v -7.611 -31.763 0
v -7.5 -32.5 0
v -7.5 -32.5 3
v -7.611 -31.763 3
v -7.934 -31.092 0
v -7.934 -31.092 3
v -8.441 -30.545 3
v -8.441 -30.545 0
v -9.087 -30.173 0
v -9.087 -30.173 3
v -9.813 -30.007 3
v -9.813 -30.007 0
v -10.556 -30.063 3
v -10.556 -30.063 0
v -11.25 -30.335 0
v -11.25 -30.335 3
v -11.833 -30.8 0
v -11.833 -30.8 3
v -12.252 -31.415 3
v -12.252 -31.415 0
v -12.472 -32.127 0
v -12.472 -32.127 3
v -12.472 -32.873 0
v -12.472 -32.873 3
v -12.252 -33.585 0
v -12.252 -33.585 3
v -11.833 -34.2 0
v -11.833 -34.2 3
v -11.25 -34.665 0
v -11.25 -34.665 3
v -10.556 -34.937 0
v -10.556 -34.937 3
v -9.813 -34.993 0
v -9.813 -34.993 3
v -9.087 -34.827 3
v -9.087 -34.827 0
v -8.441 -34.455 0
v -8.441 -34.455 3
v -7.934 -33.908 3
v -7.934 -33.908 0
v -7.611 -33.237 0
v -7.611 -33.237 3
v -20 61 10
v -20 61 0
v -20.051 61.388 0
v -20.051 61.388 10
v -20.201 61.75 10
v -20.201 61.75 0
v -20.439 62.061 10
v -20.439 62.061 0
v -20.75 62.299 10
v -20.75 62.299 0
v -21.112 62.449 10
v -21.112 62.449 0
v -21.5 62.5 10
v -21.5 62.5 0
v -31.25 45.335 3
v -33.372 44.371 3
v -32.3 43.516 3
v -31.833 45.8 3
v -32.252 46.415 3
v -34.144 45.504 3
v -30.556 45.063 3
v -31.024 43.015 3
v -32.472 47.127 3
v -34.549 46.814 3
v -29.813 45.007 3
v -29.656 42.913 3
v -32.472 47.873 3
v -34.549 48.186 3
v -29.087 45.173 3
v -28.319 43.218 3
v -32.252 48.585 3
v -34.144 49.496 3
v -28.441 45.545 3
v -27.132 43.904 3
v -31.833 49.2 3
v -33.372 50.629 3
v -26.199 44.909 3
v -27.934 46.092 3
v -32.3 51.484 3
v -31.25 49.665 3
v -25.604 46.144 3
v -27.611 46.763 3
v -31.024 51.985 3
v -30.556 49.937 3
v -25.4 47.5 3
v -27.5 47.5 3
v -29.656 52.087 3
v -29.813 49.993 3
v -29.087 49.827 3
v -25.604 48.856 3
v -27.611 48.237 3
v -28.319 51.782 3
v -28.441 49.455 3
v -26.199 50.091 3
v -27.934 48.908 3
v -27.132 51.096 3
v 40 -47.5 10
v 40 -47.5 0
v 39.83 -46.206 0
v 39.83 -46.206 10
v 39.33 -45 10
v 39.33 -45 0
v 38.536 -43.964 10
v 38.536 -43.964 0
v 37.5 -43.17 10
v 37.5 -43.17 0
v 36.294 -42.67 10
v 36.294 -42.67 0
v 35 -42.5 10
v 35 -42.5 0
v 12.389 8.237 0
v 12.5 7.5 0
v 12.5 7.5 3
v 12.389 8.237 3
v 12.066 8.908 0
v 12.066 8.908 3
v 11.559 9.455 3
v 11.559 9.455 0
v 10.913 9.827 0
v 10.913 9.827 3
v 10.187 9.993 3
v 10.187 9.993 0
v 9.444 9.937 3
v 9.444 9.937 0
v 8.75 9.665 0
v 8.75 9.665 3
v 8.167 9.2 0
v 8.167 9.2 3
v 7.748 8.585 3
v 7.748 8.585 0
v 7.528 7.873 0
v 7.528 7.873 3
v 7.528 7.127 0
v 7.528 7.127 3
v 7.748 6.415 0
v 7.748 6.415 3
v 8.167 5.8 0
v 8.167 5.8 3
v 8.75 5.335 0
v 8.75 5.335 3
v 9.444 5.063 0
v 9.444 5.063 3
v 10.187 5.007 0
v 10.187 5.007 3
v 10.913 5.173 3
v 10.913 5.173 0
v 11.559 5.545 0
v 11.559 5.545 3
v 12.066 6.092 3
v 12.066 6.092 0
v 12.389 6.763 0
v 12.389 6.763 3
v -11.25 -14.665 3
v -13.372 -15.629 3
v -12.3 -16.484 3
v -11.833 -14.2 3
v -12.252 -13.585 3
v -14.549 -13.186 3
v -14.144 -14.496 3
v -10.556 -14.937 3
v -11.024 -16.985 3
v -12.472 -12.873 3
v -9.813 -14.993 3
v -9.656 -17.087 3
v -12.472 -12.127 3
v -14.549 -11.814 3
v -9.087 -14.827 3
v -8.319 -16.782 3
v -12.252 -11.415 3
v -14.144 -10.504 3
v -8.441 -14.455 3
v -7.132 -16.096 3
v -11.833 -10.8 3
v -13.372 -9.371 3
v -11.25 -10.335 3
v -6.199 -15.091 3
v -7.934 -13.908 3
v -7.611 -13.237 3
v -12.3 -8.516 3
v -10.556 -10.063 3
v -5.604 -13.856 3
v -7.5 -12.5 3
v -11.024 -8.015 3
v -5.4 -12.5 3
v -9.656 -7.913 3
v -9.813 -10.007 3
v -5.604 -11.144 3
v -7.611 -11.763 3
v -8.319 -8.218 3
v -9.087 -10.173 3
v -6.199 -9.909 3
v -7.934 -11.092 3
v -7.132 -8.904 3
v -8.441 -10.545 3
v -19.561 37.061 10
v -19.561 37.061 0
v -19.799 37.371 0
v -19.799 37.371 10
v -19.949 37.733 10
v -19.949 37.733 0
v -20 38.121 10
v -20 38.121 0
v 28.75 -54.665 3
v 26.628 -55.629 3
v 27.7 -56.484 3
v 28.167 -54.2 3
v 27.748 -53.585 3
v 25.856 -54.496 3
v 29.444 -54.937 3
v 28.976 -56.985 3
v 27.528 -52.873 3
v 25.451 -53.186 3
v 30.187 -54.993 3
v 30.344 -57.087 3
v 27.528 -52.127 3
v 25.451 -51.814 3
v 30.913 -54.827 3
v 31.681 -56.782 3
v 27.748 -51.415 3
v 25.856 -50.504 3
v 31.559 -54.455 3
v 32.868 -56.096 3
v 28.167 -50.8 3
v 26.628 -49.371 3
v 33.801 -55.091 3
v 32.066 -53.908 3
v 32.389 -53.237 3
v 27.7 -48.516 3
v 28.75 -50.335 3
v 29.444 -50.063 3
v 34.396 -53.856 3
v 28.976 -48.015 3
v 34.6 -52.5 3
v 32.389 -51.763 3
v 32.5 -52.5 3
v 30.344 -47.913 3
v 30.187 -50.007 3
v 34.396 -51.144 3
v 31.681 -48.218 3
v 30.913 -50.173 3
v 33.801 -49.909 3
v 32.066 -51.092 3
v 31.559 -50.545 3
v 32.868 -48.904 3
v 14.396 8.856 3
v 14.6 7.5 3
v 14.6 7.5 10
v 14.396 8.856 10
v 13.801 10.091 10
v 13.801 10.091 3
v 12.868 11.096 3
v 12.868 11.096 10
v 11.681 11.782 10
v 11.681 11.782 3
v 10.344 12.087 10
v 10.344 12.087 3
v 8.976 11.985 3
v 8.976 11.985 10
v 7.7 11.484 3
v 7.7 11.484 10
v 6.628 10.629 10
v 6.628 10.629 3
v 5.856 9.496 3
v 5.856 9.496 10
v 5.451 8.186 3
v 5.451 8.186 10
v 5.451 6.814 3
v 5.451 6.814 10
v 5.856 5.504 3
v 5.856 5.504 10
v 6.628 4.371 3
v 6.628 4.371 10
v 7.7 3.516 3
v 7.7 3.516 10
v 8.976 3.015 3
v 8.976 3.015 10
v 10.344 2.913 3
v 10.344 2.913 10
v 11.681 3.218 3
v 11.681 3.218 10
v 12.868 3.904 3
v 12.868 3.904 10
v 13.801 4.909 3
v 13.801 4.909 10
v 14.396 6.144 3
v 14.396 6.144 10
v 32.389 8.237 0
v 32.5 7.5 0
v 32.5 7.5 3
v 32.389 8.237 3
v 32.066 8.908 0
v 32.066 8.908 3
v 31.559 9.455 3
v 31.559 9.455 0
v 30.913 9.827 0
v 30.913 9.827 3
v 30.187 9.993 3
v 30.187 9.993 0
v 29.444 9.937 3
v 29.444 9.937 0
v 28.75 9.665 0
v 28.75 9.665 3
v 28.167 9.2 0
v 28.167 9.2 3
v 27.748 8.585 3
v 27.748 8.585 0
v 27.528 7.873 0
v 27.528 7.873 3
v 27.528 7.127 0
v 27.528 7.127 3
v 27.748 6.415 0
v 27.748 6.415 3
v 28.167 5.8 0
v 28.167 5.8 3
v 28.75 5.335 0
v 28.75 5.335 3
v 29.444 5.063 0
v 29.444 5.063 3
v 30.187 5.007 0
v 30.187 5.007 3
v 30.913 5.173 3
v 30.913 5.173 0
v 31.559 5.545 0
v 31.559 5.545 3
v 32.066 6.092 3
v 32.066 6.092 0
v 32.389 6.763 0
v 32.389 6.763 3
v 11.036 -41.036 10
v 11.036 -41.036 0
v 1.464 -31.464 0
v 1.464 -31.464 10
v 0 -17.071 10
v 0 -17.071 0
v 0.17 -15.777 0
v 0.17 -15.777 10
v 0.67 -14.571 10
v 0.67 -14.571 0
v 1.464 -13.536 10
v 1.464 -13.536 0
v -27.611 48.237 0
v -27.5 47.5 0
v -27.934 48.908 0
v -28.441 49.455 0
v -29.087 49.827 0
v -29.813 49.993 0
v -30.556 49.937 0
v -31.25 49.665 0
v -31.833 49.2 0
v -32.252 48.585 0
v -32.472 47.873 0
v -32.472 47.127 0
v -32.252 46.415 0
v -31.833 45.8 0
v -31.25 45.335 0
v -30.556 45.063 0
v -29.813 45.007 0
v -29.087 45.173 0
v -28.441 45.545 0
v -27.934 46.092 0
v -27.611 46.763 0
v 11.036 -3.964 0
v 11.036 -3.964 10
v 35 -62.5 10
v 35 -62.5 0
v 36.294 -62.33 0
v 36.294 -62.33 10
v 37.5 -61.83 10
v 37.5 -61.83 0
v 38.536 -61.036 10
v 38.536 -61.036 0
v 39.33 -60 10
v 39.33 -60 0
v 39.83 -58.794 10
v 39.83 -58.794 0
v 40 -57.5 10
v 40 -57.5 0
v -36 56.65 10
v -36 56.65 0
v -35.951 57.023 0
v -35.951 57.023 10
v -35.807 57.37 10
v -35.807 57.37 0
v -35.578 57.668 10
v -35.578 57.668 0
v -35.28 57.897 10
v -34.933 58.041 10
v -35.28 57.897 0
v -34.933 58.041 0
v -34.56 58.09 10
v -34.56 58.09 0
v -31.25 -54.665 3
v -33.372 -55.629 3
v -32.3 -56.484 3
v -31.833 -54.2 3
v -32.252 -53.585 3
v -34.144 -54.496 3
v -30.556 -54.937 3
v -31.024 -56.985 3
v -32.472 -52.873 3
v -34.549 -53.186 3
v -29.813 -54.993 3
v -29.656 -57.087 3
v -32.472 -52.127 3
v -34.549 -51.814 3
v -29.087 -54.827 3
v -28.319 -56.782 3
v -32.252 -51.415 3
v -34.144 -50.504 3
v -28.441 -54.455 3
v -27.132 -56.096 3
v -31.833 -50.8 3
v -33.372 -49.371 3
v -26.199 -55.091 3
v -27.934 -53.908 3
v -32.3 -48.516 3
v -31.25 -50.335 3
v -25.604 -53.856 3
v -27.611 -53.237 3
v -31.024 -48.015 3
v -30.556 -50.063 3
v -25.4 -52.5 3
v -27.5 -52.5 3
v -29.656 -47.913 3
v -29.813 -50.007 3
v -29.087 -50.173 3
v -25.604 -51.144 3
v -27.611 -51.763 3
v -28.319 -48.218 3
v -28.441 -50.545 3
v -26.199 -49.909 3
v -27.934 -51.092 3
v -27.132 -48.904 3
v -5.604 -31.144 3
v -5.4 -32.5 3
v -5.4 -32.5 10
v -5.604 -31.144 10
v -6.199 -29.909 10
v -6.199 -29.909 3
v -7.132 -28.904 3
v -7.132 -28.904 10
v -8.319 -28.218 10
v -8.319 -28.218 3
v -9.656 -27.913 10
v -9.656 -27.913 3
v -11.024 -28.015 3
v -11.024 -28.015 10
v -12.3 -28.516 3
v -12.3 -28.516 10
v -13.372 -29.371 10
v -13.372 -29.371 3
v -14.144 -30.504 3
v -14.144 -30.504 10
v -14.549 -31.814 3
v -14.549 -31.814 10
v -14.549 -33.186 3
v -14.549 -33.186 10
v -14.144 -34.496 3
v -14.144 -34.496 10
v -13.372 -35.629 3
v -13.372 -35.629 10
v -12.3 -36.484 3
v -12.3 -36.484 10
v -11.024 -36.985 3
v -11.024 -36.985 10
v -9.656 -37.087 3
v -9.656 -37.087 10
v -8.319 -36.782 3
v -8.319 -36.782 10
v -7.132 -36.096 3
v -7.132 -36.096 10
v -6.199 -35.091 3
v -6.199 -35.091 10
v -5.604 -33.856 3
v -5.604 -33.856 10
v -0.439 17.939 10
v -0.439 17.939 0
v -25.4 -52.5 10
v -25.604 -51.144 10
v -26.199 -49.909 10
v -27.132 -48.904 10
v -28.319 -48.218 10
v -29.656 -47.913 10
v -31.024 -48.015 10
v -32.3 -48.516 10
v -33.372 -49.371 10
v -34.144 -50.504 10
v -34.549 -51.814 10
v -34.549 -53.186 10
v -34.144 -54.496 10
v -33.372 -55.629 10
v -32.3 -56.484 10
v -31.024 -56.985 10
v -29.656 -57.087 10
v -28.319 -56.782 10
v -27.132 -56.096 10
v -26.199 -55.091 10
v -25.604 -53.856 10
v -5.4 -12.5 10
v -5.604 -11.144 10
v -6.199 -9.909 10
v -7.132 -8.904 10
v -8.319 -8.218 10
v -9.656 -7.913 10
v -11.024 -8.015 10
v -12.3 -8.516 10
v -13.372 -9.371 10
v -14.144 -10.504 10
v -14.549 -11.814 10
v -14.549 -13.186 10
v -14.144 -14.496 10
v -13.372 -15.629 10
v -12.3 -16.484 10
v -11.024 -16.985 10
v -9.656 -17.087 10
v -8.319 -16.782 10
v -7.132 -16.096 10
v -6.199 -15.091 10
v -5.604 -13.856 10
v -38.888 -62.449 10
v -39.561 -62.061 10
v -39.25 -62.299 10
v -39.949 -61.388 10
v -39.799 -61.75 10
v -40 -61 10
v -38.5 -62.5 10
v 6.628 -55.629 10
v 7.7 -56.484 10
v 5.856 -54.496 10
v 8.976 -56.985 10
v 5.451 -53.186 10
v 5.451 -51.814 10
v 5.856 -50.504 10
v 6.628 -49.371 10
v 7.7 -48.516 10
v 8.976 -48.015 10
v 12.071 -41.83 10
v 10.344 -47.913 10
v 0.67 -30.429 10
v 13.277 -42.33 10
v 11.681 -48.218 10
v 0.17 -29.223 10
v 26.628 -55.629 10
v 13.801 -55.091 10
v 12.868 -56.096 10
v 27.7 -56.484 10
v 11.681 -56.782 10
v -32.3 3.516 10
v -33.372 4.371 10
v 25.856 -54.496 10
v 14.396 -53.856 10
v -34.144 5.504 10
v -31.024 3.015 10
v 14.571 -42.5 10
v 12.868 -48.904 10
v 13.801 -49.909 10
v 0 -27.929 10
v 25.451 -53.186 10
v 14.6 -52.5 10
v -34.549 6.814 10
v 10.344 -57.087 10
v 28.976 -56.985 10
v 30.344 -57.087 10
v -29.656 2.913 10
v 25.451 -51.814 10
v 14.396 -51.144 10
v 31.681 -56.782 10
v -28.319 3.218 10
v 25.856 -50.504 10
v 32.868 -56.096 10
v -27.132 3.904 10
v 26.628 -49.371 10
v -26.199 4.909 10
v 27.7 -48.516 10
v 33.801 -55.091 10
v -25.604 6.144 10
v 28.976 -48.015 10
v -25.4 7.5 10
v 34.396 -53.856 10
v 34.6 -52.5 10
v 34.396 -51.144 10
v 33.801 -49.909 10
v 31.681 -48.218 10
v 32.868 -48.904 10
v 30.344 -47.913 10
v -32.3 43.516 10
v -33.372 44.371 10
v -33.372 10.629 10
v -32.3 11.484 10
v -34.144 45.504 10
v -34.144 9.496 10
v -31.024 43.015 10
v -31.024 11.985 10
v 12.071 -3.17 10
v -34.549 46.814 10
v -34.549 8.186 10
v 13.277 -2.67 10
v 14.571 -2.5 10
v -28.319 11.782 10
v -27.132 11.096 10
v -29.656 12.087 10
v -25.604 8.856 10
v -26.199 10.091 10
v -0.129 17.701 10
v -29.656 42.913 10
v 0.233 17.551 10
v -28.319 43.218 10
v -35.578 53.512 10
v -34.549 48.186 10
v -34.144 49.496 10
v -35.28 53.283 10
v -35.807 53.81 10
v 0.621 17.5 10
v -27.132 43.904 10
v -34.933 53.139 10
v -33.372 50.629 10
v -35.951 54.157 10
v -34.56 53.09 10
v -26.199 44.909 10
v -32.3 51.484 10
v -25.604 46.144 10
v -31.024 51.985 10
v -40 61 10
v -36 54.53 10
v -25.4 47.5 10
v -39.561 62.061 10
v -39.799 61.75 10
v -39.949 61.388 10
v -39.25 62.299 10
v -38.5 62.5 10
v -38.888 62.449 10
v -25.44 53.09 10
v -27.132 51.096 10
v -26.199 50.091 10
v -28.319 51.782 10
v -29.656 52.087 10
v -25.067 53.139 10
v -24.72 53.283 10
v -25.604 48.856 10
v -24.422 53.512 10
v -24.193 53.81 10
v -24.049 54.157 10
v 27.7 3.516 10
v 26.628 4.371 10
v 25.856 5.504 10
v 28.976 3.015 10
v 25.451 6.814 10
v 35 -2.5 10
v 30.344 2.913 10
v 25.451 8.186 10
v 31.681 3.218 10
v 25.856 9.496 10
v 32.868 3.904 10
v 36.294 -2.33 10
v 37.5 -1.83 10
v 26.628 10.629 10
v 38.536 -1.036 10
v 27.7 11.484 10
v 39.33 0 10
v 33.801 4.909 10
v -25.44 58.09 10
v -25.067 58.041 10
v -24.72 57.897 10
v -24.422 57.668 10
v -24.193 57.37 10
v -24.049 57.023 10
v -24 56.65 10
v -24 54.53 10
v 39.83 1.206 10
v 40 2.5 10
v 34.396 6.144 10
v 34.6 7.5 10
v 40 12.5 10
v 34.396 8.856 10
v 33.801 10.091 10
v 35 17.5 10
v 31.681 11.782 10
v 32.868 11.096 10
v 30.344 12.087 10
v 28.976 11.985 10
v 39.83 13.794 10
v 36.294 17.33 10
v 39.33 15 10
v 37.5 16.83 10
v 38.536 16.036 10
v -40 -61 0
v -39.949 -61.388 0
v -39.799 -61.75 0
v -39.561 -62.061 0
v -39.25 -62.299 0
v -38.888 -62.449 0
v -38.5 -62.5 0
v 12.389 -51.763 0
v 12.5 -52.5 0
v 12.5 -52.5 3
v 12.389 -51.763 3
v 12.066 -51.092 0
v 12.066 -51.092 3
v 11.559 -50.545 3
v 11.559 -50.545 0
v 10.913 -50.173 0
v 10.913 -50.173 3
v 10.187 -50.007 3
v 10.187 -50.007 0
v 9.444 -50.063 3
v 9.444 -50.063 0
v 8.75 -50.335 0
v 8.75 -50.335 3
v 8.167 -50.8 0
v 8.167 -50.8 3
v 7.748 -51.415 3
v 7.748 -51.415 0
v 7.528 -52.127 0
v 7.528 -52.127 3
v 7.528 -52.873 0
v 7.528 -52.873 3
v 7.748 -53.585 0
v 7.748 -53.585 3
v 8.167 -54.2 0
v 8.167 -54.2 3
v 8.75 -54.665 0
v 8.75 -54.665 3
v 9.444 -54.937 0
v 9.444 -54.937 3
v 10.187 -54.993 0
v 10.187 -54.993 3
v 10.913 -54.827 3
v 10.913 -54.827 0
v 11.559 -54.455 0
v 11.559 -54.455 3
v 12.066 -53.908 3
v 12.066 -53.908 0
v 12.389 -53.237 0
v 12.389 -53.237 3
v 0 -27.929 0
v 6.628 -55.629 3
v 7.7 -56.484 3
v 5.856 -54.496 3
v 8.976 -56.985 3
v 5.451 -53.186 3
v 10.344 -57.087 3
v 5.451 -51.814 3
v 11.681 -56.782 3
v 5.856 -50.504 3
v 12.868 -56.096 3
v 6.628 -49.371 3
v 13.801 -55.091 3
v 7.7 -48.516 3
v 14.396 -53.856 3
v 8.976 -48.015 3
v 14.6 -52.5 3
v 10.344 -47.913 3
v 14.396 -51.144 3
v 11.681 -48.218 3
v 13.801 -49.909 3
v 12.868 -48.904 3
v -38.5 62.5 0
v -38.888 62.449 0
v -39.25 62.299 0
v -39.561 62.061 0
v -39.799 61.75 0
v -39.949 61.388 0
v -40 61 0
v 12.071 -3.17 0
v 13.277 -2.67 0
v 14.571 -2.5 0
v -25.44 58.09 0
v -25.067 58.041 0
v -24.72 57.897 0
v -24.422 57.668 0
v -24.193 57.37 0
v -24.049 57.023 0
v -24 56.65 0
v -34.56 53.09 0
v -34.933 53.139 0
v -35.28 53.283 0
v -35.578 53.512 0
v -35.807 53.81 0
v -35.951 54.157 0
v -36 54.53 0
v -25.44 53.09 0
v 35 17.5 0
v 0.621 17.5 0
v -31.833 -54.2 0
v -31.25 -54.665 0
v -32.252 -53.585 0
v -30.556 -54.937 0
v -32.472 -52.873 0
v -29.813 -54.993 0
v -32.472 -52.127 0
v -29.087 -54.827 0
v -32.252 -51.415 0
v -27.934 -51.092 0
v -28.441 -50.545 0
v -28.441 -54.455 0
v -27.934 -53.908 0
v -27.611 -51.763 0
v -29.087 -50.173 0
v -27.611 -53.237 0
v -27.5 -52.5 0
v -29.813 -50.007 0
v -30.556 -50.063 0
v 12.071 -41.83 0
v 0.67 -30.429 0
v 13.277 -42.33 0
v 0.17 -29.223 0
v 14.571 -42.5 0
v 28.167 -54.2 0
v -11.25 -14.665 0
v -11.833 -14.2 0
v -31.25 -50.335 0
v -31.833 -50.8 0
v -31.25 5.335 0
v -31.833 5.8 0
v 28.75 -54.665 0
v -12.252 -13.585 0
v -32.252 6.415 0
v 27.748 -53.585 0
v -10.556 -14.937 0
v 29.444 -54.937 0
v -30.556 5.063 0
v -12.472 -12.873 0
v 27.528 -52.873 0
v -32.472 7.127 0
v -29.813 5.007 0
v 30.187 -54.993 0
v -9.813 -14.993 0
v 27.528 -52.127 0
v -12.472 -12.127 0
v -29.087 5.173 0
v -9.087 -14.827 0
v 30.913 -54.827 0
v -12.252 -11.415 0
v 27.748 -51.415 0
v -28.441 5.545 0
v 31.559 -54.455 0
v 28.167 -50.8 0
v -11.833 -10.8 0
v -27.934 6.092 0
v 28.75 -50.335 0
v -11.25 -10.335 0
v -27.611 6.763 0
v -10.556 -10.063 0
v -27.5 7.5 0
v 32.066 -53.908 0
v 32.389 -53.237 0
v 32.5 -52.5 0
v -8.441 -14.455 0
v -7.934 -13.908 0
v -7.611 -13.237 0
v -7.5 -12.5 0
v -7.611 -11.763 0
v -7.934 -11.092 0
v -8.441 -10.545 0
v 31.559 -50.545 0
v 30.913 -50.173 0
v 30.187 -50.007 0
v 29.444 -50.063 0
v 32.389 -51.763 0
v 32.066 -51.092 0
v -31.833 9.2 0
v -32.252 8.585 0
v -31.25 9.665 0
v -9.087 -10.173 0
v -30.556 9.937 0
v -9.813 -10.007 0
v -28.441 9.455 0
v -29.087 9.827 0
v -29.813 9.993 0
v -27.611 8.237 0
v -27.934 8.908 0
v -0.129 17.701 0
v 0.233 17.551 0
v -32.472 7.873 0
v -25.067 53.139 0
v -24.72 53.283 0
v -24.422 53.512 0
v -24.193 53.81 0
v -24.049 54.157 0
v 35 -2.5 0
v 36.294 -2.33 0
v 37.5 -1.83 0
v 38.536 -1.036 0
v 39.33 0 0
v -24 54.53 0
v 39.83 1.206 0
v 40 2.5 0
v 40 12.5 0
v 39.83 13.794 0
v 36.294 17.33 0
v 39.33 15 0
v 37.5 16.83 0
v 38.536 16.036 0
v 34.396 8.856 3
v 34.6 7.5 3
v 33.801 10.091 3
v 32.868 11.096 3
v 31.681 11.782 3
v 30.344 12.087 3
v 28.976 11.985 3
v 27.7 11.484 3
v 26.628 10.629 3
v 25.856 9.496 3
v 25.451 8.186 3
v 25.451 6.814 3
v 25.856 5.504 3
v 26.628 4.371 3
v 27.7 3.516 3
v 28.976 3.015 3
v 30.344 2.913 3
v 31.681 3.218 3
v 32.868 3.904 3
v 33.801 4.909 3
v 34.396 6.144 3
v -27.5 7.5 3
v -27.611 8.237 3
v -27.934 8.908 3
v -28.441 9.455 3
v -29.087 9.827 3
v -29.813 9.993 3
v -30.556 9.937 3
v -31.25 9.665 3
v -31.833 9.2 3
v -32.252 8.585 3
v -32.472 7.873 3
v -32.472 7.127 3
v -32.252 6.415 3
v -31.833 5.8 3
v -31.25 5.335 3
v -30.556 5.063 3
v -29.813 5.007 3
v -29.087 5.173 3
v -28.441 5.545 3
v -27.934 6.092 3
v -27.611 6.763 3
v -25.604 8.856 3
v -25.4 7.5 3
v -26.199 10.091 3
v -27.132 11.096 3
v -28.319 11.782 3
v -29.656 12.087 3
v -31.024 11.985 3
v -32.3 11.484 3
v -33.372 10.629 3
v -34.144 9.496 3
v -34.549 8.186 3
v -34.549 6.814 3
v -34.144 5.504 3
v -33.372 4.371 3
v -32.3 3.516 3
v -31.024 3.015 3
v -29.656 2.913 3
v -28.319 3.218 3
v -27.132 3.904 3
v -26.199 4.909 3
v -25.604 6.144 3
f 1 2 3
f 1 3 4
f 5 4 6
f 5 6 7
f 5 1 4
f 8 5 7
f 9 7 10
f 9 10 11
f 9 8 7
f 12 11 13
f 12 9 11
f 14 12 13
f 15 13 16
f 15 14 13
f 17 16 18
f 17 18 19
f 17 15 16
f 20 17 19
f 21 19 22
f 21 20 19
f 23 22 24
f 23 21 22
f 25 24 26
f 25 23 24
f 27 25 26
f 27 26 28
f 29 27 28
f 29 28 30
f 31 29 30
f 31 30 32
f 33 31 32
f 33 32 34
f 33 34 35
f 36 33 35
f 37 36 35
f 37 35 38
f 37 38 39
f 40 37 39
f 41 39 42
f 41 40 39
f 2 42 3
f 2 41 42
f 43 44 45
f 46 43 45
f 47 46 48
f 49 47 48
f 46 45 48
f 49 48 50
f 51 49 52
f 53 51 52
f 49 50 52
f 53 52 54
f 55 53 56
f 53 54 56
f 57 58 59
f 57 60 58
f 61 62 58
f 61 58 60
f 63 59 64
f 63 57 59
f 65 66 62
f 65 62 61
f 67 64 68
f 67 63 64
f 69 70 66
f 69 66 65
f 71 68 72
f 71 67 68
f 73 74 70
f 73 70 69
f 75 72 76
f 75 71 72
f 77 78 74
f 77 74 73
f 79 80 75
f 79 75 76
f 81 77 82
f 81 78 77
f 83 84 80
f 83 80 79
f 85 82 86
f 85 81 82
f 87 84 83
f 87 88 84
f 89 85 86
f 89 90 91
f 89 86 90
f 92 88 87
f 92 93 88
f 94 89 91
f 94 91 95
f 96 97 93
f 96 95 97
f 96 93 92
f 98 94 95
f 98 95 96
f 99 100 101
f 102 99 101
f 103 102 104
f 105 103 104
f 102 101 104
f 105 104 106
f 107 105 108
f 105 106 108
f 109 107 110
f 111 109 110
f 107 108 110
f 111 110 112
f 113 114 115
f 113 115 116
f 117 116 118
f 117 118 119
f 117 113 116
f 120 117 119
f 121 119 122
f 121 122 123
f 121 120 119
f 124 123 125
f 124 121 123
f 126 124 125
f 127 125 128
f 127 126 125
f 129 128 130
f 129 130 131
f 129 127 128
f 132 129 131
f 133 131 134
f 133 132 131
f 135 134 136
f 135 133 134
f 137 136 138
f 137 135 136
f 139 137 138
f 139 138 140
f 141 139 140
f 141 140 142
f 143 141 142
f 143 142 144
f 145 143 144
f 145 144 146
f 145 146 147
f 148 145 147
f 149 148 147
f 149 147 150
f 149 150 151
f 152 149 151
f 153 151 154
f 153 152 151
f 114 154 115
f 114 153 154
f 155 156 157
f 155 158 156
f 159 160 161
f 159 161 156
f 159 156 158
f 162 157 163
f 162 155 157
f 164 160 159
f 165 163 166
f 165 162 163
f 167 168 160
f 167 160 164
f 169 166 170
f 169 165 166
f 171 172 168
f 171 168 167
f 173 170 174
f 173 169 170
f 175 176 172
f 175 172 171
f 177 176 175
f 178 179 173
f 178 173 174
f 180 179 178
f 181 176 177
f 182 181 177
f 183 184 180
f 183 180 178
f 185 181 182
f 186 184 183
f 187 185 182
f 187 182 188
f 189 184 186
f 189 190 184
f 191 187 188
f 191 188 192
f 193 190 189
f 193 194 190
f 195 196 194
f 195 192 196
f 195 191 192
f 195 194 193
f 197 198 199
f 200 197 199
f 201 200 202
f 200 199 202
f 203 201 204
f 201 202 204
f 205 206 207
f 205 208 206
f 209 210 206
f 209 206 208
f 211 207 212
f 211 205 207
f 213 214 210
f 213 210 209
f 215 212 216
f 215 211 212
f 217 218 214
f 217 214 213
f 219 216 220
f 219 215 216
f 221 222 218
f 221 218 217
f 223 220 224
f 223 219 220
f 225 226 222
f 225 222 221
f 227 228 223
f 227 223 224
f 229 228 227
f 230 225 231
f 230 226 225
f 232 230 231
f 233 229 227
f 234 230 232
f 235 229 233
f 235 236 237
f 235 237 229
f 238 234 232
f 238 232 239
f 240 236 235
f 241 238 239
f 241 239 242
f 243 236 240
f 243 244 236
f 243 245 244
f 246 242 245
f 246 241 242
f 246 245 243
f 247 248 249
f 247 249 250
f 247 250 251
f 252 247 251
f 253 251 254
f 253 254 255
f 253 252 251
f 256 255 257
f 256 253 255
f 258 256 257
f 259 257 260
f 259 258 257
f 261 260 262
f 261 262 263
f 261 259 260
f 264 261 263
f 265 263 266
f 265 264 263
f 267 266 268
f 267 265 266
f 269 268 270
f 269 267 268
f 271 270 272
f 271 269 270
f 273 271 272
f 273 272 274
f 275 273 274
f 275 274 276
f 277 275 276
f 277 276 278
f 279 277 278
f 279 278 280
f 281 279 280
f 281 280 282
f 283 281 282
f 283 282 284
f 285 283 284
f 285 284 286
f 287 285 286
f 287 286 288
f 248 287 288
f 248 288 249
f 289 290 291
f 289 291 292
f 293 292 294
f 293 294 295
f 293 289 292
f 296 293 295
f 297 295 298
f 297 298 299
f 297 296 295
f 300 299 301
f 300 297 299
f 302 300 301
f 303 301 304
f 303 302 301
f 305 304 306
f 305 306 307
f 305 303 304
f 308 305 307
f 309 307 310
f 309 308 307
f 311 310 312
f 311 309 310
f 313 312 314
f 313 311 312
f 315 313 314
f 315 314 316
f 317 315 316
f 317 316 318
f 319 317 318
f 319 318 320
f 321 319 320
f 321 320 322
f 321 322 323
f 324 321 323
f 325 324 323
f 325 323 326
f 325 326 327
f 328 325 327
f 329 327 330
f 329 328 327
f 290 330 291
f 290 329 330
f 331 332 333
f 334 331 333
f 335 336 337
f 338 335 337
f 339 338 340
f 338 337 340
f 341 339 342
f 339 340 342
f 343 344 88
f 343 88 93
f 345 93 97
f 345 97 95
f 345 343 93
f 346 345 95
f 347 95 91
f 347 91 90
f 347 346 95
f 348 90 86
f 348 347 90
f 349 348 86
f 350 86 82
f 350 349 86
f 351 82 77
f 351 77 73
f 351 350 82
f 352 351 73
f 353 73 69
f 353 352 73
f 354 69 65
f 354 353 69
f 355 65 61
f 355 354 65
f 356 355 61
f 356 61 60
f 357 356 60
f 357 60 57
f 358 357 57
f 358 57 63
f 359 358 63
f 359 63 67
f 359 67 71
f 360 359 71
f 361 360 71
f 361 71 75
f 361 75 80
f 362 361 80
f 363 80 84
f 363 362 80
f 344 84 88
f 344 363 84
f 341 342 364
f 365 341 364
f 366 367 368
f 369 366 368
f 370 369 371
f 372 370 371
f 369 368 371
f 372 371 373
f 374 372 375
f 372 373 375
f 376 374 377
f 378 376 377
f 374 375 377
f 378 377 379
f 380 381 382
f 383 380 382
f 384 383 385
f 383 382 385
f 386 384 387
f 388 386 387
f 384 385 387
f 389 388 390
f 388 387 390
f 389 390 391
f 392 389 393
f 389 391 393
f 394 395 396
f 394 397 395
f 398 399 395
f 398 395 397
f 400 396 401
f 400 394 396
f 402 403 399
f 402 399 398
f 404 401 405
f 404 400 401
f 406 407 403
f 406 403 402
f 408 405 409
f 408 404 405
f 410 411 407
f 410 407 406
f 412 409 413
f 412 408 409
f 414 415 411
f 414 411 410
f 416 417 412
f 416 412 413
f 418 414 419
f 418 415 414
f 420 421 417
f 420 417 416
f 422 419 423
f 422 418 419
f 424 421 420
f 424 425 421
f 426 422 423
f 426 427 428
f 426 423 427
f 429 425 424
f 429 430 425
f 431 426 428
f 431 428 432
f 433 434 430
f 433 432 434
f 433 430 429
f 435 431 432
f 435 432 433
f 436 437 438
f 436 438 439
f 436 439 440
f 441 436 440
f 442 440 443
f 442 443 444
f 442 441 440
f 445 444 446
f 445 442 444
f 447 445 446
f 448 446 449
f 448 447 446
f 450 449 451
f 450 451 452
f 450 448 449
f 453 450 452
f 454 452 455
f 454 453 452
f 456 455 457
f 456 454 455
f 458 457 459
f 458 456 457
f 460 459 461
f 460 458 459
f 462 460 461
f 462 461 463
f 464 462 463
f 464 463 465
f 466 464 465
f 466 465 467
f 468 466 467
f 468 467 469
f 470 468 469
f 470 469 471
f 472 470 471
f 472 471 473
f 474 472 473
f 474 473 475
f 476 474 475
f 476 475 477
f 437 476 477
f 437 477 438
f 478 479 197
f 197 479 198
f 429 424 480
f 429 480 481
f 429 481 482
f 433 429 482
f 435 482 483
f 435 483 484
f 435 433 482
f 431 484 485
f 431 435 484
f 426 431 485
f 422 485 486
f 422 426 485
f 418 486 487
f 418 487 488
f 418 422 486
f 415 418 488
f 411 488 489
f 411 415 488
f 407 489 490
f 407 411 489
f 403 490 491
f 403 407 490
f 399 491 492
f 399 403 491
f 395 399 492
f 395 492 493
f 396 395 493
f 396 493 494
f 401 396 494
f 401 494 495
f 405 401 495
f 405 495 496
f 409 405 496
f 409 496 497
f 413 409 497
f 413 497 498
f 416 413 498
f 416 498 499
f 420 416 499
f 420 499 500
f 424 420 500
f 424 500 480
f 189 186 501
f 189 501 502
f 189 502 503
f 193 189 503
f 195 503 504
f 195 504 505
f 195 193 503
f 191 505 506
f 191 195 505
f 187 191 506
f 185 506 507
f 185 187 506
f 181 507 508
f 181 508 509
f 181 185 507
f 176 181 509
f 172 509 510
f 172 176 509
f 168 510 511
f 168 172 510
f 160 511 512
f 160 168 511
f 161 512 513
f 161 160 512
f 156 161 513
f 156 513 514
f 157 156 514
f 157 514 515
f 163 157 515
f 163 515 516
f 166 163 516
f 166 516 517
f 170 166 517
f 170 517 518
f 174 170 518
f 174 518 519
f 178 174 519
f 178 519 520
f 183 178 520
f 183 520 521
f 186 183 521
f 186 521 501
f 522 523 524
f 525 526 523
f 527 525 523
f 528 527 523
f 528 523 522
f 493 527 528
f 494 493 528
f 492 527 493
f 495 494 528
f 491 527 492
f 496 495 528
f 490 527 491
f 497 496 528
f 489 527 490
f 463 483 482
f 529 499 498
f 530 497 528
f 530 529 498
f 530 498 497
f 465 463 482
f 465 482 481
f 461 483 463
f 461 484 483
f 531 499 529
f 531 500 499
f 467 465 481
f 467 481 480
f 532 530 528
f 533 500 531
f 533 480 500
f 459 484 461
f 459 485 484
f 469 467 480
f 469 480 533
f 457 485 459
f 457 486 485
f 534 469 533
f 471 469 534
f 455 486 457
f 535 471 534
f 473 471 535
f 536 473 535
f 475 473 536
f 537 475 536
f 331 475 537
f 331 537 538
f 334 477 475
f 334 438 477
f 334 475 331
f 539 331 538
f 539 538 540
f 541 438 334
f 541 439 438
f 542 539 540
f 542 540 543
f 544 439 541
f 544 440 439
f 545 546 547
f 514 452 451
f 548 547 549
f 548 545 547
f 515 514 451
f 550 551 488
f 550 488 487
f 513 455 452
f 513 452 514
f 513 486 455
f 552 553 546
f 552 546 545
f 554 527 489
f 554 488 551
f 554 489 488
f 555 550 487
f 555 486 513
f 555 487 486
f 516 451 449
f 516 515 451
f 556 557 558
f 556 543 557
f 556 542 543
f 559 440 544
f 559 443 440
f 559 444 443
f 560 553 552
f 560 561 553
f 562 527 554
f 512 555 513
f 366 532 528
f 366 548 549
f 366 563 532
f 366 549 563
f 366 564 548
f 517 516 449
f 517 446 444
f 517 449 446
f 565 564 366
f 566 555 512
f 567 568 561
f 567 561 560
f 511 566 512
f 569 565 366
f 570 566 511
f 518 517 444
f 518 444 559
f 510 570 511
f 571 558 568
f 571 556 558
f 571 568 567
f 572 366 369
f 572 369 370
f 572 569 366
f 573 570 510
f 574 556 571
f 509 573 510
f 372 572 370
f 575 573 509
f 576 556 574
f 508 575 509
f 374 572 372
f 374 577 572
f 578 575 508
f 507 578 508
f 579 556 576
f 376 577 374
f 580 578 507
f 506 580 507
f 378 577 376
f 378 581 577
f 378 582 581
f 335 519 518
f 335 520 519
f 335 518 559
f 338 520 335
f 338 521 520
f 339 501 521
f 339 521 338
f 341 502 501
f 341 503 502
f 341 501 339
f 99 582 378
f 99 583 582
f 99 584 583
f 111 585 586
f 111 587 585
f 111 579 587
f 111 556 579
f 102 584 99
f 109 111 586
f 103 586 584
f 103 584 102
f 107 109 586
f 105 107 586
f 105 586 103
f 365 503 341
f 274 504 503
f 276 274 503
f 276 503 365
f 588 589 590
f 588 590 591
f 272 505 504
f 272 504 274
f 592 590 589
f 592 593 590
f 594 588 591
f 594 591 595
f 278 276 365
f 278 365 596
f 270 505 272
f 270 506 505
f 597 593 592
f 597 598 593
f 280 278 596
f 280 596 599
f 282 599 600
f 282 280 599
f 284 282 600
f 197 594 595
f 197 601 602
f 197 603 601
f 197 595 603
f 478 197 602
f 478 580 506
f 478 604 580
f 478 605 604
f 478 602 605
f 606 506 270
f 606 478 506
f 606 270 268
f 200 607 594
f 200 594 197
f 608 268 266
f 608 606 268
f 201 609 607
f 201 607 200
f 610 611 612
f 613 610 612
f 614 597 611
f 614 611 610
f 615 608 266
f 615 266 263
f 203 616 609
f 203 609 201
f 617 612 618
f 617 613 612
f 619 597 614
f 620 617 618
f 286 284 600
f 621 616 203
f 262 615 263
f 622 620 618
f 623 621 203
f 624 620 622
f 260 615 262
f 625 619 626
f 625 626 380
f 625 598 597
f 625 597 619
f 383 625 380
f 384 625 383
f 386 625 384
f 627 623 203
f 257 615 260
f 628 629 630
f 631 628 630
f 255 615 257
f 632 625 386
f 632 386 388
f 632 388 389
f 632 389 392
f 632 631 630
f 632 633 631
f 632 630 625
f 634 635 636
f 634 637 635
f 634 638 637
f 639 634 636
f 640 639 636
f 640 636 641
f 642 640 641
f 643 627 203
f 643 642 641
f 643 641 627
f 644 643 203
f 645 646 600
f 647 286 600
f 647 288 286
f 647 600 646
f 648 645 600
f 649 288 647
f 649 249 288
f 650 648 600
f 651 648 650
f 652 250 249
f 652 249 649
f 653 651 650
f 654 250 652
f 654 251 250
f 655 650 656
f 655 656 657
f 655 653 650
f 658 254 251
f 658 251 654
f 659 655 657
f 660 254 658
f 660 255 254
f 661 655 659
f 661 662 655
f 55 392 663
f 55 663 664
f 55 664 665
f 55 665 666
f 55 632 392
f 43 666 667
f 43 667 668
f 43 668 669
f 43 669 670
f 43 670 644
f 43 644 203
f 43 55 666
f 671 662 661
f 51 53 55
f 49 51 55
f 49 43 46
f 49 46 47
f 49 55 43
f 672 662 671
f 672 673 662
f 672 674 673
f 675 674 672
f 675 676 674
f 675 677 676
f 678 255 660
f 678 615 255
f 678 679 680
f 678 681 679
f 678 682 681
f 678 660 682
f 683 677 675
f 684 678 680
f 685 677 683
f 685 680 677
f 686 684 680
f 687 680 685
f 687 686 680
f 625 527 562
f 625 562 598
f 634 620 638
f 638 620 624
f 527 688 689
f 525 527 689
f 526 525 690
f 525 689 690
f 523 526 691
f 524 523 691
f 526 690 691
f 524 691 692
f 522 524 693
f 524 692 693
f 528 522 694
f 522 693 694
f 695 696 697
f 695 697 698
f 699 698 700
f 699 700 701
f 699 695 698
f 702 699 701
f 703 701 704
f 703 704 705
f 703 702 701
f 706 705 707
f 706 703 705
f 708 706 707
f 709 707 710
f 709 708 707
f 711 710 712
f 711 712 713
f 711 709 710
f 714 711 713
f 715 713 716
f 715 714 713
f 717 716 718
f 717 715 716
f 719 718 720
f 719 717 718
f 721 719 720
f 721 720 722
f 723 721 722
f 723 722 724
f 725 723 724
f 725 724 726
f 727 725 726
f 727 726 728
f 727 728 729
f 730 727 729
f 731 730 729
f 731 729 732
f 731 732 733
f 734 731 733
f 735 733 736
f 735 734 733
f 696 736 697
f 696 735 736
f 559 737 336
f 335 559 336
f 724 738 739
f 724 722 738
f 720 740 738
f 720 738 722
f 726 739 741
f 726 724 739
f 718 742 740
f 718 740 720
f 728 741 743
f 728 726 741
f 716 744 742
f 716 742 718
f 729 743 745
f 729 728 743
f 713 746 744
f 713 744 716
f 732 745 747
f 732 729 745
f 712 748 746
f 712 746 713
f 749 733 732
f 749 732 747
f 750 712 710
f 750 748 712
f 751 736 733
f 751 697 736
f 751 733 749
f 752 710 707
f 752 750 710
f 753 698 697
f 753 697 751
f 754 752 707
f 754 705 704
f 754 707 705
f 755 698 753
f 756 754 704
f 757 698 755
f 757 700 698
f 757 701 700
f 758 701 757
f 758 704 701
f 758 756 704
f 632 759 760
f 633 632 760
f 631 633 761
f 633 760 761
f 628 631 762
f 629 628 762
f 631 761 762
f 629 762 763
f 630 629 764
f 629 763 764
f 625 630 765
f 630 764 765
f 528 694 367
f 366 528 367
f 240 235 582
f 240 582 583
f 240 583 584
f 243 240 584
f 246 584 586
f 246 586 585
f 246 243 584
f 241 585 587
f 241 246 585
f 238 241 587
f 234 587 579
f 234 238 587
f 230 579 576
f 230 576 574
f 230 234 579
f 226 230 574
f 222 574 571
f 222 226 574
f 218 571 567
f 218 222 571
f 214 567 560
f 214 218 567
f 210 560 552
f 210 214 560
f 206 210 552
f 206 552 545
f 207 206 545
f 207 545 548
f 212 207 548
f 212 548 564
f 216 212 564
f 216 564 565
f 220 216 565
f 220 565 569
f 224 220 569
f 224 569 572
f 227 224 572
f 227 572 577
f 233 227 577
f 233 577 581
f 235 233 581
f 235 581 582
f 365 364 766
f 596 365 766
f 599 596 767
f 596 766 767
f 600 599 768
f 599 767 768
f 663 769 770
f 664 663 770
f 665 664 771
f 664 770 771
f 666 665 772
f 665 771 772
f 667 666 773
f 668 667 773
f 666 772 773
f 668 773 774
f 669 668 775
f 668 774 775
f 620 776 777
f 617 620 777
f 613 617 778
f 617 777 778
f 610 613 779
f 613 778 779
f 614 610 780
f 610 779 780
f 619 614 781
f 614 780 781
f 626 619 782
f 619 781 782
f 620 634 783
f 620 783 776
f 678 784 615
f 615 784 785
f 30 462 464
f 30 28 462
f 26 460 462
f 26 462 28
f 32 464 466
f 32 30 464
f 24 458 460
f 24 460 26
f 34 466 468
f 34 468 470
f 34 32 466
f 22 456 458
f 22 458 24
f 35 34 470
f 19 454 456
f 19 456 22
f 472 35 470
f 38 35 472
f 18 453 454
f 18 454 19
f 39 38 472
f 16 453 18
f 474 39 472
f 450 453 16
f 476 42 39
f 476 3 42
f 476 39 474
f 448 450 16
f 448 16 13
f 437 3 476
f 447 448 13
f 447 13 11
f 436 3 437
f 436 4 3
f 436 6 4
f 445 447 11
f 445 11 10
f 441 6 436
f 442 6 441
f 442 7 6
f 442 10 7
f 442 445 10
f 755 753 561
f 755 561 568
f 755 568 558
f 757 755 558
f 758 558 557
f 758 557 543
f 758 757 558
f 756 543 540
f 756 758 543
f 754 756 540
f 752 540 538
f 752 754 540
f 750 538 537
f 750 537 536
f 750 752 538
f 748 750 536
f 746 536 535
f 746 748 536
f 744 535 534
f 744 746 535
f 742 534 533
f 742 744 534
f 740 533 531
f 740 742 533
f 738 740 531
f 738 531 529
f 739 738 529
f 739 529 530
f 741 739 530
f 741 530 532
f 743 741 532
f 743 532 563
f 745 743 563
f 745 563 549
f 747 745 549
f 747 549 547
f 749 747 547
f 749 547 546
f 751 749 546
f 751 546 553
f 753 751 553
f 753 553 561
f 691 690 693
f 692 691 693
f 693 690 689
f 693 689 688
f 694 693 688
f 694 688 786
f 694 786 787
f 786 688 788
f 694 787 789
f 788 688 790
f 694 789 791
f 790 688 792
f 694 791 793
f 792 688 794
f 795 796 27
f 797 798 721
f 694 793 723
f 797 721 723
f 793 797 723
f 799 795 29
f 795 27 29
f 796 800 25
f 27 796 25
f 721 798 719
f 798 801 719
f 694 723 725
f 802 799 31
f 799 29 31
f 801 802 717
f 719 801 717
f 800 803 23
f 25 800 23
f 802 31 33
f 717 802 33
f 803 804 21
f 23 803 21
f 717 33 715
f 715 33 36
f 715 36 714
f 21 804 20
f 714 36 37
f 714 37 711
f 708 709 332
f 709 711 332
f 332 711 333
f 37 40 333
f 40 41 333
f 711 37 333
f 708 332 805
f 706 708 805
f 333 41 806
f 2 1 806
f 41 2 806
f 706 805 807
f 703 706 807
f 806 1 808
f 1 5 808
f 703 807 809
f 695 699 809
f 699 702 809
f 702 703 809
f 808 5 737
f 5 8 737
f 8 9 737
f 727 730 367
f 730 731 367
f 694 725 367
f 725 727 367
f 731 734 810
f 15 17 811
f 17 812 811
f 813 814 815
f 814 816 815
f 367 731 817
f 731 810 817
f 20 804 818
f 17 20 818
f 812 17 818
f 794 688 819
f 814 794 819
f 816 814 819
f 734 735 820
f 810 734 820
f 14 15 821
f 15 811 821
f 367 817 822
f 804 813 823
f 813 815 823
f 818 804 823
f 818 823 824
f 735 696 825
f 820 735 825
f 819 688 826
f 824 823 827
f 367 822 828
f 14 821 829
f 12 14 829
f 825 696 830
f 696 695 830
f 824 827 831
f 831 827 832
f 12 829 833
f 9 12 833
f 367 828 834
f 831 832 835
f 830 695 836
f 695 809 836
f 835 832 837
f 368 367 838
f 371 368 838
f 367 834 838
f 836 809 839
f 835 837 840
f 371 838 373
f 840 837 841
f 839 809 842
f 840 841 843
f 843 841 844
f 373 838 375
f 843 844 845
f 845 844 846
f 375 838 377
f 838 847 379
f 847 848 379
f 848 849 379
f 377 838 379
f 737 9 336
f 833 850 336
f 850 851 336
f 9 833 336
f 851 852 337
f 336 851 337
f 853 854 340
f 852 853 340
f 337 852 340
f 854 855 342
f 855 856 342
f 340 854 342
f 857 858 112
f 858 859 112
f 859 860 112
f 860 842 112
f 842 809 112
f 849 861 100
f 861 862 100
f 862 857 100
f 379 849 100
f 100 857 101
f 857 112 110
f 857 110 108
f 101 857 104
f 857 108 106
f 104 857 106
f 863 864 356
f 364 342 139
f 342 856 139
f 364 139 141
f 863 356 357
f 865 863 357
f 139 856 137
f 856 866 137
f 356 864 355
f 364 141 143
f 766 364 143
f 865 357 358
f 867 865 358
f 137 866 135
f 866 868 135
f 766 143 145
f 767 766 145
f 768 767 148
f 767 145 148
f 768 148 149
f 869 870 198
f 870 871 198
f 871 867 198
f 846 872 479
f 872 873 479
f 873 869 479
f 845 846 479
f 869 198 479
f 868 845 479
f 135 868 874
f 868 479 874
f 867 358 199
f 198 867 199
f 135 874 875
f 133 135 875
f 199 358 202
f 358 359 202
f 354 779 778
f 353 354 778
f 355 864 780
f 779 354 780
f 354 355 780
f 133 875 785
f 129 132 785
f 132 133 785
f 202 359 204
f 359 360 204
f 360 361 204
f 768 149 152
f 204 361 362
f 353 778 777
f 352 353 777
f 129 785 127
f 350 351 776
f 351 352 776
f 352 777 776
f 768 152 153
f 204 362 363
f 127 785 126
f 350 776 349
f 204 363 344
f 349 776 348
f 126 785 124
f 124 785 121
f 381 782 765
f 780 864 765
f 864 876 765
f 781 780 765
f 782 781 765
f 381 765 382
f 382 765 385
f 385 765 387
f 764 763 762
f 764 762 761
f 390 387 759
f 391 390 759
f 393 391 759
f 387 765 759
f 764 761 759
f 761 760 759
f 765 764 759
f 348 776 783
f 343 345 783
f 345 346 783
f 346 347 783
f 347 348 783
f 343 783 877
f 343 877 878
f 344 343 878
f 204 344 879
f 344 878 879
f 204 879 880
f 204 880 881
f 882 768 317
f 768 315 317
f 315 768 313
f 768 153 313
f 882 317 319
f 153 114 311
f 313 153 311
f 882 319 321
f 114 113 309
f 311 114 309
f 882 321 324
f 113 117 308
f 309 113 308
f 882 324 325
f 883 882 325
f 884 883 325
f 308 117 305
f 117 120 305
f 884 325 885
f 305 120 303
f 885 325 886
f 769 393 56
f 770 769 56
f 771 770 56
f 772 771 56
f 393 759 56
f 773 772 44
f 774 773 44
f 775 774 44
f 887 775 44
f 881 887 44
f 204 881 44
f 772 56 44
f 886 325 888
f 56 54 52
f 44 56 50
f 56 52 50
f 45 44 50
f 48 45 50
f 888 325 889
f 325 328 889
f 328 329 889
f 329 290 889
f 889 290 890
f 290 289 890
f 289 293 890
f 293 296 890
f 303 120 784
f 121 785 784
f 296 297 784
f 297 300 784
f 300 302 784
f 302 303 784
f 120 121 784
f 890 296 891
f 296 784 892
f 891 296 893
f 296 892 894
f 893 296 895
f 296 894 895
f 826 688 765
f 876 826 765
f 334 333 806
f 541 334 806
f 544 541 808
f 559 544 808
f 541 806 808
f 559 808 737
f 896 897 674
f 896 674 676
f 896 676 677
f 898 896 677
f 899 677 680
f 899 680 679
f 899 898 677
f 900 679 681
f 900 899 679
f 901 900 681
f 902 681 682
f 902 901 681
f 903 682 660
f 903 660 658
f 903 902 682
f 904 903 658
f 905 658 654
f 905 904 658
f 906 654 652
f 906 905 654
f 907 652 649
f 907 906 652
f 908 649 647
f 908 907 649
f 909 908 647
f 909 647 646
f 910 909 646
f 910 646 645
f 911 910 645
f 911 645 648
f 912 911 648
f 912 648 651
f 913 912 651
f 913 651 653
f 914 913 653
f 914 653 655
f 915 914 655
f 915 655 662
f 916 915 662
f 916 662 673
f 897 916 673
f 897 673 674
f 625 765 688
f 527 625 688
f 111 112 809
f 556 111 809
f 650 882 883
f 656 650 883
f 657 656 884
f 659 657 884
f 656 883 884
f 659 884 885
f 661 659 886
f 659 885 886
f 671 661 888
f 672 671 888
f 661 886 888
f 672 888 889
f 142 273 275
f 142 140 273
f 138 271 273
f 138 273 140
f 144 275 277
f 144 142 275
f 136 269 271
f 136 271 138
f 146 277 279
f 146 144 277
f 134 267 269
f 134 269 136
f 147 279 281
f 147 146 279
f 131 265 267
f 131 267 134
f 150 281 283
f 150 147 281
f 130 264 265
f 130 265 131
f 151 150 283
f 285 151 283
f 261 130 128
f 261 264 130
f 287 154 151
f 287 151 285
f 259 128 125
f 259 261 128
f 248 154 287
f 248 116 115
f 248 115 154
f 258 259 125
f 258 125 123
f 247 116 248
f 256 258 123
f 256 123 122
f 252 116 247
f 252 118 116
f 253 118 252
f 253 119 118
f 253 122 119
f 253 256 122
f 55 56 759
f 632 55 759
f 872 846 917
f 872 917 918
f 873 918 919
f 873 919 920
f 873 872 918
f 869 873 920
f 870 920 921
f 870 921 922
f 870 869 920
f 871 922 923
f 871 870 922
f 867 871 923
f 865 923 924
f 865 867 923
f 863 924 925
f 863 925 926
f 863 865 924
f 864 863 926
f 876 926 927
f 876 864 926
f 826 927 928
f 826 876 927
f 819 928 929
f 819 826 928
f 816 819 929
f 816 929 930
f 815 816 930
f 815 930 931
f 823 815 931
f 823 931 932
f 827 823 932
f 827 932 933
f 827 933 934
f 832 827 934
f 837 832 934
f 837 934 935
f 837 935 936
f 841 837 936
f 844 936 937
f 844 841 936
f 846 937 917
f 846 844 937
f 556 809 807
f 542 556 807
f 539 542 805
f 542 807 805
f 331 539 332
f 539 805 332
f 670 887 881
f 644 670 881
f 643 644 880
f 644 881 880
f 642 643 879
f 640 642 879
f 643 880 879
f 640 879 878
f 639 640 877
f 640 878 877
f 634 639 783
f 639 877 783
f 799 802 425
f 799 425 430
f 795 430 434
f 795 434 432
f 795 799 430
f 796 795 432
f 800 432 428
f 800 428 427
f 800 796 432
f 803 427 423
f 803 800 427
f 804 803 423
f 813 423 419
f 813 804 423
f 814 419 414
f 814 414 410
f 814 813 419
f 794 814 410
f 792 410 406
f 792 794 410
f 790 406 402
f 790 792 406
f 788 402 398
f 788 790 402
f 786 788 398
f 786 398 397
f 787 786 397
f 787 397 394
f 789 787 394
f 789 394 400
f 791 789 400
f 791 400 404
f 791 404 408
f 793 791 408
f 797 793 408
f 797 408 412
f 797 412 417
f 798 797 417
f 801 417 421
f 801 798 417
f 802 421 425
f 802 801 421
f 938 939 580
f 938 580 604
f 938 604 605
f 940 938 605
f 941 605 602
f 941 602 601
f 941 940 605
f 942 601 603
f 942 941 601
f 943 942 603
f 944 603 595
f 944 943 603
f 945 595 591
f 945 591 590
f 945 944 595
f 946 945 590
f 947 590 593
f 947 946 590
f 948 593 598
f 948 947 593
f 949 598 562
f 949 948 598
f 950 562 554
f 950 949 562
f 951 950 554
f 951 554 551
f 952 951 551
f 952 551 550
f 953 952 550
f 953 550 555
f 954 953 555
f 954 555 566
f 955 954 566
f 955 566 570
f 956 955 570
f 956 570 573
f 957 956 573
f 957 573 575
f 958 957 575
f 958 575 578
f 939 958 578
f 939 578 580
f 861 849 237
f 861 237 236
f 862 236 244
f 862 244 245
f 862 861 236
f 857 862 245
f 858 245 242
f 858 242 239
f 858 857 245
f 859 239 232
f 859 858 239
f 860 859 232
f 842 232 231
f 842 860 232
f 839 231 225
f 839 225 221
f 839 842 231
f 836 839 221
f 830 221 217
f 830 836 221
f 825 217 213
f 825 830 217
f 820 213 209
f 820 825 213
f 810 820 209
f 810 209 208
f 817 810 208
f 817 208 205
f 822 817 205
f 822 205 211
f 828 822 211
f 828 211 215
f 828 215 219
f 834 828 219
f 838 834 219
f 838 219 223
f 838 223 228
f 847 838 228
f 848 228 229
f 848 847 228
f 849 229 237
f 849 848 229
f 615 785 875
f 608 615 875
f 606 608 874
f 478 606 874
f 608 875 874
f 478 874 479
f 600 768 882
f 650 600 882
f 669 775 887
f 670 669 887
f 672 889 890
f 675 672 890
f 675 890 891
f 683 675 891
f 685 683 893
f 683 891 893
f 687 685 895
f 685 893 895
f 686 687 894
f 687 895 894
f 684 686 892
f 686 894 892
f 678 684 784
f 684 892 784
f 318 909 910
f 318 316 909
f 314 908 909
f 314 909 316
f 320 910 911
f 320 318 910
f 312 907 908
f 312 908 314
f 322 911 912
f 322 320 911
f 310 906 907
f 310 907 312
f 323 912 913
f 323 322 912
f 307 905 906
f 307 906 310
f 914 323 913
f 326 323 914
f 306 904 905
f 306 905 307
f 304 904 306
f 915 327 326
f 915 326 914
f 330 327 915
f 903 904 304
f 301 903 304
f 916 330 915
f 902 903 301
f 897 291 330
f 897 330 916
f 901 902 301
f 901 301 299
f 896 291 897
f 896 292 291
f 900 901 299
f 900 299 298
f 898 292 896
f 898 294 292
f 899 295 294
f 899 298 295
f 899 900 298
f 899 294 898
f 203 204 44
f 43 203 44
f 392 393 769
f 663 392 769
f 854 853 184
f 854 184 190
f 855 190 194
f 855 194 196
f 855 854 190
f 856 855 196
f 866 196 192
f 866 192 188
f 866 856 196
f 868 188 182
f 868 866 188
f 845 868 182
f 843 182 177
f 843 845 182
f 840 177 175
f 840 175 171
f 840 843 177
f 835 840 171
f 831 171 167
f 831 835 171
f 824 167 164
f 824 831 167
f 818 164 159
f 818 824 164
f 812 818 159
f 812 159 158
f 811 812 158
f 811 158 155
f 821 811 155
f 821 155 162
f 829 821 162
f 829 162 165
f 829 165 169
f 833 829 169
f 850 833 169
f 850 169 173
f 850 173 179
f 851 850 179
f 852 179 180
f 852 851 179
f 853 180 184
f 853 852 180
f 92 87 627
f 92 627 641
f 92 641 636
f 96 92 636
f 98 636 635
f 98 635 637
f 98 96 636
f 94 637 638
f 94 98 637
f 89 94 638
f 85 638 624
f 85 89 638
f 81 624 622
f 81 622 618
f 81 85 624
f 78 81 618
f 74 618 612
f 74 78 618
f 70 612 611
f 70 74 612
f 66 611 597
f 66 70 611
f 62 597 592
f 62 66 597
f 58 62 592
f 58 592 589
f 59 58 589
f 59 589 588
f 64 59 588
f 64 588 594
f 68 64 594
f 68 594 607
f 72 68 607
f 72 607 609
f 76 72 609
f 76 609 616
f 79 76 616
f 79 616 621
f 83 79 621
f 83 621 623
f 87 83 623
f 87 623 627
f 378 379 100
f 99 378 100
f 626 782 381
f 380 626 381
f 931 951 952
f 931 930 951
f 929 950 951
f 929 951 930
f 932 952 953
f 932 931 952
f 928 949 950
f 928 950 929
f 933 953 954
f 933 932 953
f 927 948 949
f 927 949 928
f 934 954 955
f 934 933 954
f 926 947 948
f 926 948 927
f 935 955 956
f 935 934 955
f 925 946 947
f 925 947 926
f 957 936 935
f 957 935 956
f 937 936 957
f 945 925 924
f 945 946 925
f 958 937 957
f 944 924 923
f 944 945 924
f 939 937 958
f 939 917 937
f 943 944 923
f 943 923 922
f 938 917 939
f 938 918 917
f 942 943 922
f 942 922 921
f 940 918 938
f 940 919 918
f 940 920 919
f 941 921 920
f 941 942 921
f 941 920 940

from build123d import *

# Parameters (mm, degrees)
F0_R     = 4.6
F1_DEPTH = 10
F0_R_2   = 2.5
F2_DEPTH = 3


# Not quite as in the source:
# - ends of sketch curves that miss each other by under 0.0002 mm in the source are joined


with BuildPart() as f1:
    # F0 (on Top) → F1 (new body)
    with BuildSketch(Plane.XY):
        with BuildLine():
            ThreePointArc((-40, -61), (-39.5606601718, -62.0606601718), (-38.5, -62.5))
            Line((-38.5, -62.5), (35, -62.5))
            ThreePointArc((35, -62.5), (38.5355339059, -61.0355339059), (40, -57.5))
            Line((40, -57.5), (40, -47.5))
            ThreePointArc((40, -47.5), (38.5355339059, -43.9644660941), (35, -42.5))
            Line((35, -42.5), (14.571067, -42.5))
            ThreePointArc((14.571067, -42.5), (12.6576501648, -42.1193977979), (11.0355335941, -41.0355344059))
            Line((11.0355335941, -41.0355344059), (1.464466, -31.464466))
            ThreePointArc((1.464466, -31.464466), (0.3806023374, -29.8423491618), (0, -27.928932))
            Line((0, -27.928932), (0, -17.071068))
            ThreePointArc((0, -17.071068), (0.3806023374, -15.1576508382), (1.4644660941, -13.5355340941))
            Line((1.4644660941, -13.5355340941), (11.035534, -3.964466))
            ThreePointArc((11.035534, -3.964466), (12.6576501648, -2.8806022021), (14.571067, -2.5))
            Line((14.571067, -2.5), (35, -2.5))
            ThreePointArc((35, -2.5), (38.5355339059, -1.0355339059), (40, 2.5))
            Line((40, 2.5), (40, 12.5))
            ThreePointArc((40, 12.5), (38.5355339059, 16.0355339059), (35, 17.5))
            Line((35, 17.5), (0.62132, 17.5))
            ThreePointArc((0.62132, 17.5), (0.0472948515, 17.6141807012), (-0.4393401718, 17.9393398282))
            Line((-0.4393401718, 17.9393398282), (-19.560661, 37.06066))
            ThreePointArc((-19.560661, 37.06066), (-19.8858192988, 37.5472958515), (-20, 38.121321))
            Line((-20, 38.121321), (-20, 61))
            ThreePointArc((-20, 61), (-20.4393398282, 62.0606601718), (-21.5, 62.5))
            Line((-21.5, 62.5), (-38.5, 62.5))
            ThreePointArc((-38.5, 62.5), (-39.5606601718, 62.0606601718), (-40, 61))
            Line((-40, 61), (-40, -61))
        make_face()
        with Locations((-30, -52.5)):
            Circle(F0_R, mode=Mode.SUBTRACT)
        with Locations((-10, -32.5)):
            Circle(F0_R, mode=Mode.SUBTRACT)
        with Locations((-10, -12.5)):
            Circle(F0_R, mode=Mode.SUBTRACT)
        with Locations((10, -52.5)):
            Circle(F0_R, mode=Mode.SUBTRACT)
        with Locations((30, -52.5)):
            Circle(F0_R, mode=Mode.SUBTRACT)
        with Locations((-30, 7.5)):
            Circle(F0_R, mode=Mode.SUBTRACT)
        with Locations((-30, 47.5)):
            Circle(F0_R, mode=Mode.SUBTRACT)
        with BuildLine():
            Line((-36, 54.53), (-36, 56.65))
            ThreePointArc((-36, 56.65), (-35.5782337649, 57.6682337649), (-34.56, 58.09))
            Line((-34.56, 58.09), (-25.44, 58.09))
            ThreePointArc((-25.44, 58.09), (-24.4217662351, 57.6682337649), (-24, 56.65))
            Line((-24, 56.65), (-24, 54.53))
            ThreePointArc((-24, 54.53), (-24.4217662351, 53.5117662351), (-25.44, 53.09))
            Line((-25.44, 53.09), (-34.56, 53.09))
            ThreePointArc((-34.56, 53.09), (-35.5782337649, 53.5117662351), (-36, 54.53))
        make_face(mode=Mode.SUBTRACT)
        with Locations((10, 7.5)):
            Circle(F0_R, mode=Mode.SUBTRACT)
        with Locations((30, 7.5)):
            Circle(F0_R, mode=Mode.SUBTRACT)
    extrude(amount=F1_DEPTH)

    # F0 (on Top) → F2 (join)
    with BuildSketch(Plane.XY):
        with Locations((-30, 47.5)):
            Circle(F0_R)
        with Locations((-30, 47.5)):
            Circle(F0_R_2, mode=Mode.SUBTRACT)
        with Locations((-30, 7.5)):
            Circle(F0_R)
        with Locations((-30, 7.5)):
            Circle(F0_R_2, mode=Mode.SUBTRACT)
        with Locations((-30, -52.5)):
            Circle(F0_R)
        with Locations((-30, -52.5)):
            Circle(F0_R_2, mode=Mode.SUBTRACT)
        with Locations((-10, -32.5)):
            Circle(F0_R)
        with Locations((-10, -32.5)):
            Circle(F0_R_2, mode=Mode.SUBTRACT)
        with Locations((10, -52.5)):
            Circle(F0_R)
        with Locations((10, -52.5)):
            Circle(F0_R_2, mode=Mode.SUBTRACT)
        with Locations((30, -52.5)):
            Circle(F0_R)
        with Locations((30, -52.5)):
            Circle(F0_R_2, mode=Mode.SUBTRACT)
        with Locations((-10, -12.5)):
            Circle(F0_R)
        with Locations((-10, -12.5)):
            Circle(F0_R_2, mode=Mode.SUBTRACT)
        with Locations((10, 7.5)):
            Circle(F0_R)
        with Locations((10, 7.5)):
            Circle(F0_R_2, mode=Mode.SUBTRACT)
        with Locations((30, 7.5)):
            Circle(F0_R)
        with Locations((30, 7.5)):
            Circle(F0_R_2, mode=Mode.SUBTRACT)
    extrude(amount=F2_DEPTH)


solid = f1.part
